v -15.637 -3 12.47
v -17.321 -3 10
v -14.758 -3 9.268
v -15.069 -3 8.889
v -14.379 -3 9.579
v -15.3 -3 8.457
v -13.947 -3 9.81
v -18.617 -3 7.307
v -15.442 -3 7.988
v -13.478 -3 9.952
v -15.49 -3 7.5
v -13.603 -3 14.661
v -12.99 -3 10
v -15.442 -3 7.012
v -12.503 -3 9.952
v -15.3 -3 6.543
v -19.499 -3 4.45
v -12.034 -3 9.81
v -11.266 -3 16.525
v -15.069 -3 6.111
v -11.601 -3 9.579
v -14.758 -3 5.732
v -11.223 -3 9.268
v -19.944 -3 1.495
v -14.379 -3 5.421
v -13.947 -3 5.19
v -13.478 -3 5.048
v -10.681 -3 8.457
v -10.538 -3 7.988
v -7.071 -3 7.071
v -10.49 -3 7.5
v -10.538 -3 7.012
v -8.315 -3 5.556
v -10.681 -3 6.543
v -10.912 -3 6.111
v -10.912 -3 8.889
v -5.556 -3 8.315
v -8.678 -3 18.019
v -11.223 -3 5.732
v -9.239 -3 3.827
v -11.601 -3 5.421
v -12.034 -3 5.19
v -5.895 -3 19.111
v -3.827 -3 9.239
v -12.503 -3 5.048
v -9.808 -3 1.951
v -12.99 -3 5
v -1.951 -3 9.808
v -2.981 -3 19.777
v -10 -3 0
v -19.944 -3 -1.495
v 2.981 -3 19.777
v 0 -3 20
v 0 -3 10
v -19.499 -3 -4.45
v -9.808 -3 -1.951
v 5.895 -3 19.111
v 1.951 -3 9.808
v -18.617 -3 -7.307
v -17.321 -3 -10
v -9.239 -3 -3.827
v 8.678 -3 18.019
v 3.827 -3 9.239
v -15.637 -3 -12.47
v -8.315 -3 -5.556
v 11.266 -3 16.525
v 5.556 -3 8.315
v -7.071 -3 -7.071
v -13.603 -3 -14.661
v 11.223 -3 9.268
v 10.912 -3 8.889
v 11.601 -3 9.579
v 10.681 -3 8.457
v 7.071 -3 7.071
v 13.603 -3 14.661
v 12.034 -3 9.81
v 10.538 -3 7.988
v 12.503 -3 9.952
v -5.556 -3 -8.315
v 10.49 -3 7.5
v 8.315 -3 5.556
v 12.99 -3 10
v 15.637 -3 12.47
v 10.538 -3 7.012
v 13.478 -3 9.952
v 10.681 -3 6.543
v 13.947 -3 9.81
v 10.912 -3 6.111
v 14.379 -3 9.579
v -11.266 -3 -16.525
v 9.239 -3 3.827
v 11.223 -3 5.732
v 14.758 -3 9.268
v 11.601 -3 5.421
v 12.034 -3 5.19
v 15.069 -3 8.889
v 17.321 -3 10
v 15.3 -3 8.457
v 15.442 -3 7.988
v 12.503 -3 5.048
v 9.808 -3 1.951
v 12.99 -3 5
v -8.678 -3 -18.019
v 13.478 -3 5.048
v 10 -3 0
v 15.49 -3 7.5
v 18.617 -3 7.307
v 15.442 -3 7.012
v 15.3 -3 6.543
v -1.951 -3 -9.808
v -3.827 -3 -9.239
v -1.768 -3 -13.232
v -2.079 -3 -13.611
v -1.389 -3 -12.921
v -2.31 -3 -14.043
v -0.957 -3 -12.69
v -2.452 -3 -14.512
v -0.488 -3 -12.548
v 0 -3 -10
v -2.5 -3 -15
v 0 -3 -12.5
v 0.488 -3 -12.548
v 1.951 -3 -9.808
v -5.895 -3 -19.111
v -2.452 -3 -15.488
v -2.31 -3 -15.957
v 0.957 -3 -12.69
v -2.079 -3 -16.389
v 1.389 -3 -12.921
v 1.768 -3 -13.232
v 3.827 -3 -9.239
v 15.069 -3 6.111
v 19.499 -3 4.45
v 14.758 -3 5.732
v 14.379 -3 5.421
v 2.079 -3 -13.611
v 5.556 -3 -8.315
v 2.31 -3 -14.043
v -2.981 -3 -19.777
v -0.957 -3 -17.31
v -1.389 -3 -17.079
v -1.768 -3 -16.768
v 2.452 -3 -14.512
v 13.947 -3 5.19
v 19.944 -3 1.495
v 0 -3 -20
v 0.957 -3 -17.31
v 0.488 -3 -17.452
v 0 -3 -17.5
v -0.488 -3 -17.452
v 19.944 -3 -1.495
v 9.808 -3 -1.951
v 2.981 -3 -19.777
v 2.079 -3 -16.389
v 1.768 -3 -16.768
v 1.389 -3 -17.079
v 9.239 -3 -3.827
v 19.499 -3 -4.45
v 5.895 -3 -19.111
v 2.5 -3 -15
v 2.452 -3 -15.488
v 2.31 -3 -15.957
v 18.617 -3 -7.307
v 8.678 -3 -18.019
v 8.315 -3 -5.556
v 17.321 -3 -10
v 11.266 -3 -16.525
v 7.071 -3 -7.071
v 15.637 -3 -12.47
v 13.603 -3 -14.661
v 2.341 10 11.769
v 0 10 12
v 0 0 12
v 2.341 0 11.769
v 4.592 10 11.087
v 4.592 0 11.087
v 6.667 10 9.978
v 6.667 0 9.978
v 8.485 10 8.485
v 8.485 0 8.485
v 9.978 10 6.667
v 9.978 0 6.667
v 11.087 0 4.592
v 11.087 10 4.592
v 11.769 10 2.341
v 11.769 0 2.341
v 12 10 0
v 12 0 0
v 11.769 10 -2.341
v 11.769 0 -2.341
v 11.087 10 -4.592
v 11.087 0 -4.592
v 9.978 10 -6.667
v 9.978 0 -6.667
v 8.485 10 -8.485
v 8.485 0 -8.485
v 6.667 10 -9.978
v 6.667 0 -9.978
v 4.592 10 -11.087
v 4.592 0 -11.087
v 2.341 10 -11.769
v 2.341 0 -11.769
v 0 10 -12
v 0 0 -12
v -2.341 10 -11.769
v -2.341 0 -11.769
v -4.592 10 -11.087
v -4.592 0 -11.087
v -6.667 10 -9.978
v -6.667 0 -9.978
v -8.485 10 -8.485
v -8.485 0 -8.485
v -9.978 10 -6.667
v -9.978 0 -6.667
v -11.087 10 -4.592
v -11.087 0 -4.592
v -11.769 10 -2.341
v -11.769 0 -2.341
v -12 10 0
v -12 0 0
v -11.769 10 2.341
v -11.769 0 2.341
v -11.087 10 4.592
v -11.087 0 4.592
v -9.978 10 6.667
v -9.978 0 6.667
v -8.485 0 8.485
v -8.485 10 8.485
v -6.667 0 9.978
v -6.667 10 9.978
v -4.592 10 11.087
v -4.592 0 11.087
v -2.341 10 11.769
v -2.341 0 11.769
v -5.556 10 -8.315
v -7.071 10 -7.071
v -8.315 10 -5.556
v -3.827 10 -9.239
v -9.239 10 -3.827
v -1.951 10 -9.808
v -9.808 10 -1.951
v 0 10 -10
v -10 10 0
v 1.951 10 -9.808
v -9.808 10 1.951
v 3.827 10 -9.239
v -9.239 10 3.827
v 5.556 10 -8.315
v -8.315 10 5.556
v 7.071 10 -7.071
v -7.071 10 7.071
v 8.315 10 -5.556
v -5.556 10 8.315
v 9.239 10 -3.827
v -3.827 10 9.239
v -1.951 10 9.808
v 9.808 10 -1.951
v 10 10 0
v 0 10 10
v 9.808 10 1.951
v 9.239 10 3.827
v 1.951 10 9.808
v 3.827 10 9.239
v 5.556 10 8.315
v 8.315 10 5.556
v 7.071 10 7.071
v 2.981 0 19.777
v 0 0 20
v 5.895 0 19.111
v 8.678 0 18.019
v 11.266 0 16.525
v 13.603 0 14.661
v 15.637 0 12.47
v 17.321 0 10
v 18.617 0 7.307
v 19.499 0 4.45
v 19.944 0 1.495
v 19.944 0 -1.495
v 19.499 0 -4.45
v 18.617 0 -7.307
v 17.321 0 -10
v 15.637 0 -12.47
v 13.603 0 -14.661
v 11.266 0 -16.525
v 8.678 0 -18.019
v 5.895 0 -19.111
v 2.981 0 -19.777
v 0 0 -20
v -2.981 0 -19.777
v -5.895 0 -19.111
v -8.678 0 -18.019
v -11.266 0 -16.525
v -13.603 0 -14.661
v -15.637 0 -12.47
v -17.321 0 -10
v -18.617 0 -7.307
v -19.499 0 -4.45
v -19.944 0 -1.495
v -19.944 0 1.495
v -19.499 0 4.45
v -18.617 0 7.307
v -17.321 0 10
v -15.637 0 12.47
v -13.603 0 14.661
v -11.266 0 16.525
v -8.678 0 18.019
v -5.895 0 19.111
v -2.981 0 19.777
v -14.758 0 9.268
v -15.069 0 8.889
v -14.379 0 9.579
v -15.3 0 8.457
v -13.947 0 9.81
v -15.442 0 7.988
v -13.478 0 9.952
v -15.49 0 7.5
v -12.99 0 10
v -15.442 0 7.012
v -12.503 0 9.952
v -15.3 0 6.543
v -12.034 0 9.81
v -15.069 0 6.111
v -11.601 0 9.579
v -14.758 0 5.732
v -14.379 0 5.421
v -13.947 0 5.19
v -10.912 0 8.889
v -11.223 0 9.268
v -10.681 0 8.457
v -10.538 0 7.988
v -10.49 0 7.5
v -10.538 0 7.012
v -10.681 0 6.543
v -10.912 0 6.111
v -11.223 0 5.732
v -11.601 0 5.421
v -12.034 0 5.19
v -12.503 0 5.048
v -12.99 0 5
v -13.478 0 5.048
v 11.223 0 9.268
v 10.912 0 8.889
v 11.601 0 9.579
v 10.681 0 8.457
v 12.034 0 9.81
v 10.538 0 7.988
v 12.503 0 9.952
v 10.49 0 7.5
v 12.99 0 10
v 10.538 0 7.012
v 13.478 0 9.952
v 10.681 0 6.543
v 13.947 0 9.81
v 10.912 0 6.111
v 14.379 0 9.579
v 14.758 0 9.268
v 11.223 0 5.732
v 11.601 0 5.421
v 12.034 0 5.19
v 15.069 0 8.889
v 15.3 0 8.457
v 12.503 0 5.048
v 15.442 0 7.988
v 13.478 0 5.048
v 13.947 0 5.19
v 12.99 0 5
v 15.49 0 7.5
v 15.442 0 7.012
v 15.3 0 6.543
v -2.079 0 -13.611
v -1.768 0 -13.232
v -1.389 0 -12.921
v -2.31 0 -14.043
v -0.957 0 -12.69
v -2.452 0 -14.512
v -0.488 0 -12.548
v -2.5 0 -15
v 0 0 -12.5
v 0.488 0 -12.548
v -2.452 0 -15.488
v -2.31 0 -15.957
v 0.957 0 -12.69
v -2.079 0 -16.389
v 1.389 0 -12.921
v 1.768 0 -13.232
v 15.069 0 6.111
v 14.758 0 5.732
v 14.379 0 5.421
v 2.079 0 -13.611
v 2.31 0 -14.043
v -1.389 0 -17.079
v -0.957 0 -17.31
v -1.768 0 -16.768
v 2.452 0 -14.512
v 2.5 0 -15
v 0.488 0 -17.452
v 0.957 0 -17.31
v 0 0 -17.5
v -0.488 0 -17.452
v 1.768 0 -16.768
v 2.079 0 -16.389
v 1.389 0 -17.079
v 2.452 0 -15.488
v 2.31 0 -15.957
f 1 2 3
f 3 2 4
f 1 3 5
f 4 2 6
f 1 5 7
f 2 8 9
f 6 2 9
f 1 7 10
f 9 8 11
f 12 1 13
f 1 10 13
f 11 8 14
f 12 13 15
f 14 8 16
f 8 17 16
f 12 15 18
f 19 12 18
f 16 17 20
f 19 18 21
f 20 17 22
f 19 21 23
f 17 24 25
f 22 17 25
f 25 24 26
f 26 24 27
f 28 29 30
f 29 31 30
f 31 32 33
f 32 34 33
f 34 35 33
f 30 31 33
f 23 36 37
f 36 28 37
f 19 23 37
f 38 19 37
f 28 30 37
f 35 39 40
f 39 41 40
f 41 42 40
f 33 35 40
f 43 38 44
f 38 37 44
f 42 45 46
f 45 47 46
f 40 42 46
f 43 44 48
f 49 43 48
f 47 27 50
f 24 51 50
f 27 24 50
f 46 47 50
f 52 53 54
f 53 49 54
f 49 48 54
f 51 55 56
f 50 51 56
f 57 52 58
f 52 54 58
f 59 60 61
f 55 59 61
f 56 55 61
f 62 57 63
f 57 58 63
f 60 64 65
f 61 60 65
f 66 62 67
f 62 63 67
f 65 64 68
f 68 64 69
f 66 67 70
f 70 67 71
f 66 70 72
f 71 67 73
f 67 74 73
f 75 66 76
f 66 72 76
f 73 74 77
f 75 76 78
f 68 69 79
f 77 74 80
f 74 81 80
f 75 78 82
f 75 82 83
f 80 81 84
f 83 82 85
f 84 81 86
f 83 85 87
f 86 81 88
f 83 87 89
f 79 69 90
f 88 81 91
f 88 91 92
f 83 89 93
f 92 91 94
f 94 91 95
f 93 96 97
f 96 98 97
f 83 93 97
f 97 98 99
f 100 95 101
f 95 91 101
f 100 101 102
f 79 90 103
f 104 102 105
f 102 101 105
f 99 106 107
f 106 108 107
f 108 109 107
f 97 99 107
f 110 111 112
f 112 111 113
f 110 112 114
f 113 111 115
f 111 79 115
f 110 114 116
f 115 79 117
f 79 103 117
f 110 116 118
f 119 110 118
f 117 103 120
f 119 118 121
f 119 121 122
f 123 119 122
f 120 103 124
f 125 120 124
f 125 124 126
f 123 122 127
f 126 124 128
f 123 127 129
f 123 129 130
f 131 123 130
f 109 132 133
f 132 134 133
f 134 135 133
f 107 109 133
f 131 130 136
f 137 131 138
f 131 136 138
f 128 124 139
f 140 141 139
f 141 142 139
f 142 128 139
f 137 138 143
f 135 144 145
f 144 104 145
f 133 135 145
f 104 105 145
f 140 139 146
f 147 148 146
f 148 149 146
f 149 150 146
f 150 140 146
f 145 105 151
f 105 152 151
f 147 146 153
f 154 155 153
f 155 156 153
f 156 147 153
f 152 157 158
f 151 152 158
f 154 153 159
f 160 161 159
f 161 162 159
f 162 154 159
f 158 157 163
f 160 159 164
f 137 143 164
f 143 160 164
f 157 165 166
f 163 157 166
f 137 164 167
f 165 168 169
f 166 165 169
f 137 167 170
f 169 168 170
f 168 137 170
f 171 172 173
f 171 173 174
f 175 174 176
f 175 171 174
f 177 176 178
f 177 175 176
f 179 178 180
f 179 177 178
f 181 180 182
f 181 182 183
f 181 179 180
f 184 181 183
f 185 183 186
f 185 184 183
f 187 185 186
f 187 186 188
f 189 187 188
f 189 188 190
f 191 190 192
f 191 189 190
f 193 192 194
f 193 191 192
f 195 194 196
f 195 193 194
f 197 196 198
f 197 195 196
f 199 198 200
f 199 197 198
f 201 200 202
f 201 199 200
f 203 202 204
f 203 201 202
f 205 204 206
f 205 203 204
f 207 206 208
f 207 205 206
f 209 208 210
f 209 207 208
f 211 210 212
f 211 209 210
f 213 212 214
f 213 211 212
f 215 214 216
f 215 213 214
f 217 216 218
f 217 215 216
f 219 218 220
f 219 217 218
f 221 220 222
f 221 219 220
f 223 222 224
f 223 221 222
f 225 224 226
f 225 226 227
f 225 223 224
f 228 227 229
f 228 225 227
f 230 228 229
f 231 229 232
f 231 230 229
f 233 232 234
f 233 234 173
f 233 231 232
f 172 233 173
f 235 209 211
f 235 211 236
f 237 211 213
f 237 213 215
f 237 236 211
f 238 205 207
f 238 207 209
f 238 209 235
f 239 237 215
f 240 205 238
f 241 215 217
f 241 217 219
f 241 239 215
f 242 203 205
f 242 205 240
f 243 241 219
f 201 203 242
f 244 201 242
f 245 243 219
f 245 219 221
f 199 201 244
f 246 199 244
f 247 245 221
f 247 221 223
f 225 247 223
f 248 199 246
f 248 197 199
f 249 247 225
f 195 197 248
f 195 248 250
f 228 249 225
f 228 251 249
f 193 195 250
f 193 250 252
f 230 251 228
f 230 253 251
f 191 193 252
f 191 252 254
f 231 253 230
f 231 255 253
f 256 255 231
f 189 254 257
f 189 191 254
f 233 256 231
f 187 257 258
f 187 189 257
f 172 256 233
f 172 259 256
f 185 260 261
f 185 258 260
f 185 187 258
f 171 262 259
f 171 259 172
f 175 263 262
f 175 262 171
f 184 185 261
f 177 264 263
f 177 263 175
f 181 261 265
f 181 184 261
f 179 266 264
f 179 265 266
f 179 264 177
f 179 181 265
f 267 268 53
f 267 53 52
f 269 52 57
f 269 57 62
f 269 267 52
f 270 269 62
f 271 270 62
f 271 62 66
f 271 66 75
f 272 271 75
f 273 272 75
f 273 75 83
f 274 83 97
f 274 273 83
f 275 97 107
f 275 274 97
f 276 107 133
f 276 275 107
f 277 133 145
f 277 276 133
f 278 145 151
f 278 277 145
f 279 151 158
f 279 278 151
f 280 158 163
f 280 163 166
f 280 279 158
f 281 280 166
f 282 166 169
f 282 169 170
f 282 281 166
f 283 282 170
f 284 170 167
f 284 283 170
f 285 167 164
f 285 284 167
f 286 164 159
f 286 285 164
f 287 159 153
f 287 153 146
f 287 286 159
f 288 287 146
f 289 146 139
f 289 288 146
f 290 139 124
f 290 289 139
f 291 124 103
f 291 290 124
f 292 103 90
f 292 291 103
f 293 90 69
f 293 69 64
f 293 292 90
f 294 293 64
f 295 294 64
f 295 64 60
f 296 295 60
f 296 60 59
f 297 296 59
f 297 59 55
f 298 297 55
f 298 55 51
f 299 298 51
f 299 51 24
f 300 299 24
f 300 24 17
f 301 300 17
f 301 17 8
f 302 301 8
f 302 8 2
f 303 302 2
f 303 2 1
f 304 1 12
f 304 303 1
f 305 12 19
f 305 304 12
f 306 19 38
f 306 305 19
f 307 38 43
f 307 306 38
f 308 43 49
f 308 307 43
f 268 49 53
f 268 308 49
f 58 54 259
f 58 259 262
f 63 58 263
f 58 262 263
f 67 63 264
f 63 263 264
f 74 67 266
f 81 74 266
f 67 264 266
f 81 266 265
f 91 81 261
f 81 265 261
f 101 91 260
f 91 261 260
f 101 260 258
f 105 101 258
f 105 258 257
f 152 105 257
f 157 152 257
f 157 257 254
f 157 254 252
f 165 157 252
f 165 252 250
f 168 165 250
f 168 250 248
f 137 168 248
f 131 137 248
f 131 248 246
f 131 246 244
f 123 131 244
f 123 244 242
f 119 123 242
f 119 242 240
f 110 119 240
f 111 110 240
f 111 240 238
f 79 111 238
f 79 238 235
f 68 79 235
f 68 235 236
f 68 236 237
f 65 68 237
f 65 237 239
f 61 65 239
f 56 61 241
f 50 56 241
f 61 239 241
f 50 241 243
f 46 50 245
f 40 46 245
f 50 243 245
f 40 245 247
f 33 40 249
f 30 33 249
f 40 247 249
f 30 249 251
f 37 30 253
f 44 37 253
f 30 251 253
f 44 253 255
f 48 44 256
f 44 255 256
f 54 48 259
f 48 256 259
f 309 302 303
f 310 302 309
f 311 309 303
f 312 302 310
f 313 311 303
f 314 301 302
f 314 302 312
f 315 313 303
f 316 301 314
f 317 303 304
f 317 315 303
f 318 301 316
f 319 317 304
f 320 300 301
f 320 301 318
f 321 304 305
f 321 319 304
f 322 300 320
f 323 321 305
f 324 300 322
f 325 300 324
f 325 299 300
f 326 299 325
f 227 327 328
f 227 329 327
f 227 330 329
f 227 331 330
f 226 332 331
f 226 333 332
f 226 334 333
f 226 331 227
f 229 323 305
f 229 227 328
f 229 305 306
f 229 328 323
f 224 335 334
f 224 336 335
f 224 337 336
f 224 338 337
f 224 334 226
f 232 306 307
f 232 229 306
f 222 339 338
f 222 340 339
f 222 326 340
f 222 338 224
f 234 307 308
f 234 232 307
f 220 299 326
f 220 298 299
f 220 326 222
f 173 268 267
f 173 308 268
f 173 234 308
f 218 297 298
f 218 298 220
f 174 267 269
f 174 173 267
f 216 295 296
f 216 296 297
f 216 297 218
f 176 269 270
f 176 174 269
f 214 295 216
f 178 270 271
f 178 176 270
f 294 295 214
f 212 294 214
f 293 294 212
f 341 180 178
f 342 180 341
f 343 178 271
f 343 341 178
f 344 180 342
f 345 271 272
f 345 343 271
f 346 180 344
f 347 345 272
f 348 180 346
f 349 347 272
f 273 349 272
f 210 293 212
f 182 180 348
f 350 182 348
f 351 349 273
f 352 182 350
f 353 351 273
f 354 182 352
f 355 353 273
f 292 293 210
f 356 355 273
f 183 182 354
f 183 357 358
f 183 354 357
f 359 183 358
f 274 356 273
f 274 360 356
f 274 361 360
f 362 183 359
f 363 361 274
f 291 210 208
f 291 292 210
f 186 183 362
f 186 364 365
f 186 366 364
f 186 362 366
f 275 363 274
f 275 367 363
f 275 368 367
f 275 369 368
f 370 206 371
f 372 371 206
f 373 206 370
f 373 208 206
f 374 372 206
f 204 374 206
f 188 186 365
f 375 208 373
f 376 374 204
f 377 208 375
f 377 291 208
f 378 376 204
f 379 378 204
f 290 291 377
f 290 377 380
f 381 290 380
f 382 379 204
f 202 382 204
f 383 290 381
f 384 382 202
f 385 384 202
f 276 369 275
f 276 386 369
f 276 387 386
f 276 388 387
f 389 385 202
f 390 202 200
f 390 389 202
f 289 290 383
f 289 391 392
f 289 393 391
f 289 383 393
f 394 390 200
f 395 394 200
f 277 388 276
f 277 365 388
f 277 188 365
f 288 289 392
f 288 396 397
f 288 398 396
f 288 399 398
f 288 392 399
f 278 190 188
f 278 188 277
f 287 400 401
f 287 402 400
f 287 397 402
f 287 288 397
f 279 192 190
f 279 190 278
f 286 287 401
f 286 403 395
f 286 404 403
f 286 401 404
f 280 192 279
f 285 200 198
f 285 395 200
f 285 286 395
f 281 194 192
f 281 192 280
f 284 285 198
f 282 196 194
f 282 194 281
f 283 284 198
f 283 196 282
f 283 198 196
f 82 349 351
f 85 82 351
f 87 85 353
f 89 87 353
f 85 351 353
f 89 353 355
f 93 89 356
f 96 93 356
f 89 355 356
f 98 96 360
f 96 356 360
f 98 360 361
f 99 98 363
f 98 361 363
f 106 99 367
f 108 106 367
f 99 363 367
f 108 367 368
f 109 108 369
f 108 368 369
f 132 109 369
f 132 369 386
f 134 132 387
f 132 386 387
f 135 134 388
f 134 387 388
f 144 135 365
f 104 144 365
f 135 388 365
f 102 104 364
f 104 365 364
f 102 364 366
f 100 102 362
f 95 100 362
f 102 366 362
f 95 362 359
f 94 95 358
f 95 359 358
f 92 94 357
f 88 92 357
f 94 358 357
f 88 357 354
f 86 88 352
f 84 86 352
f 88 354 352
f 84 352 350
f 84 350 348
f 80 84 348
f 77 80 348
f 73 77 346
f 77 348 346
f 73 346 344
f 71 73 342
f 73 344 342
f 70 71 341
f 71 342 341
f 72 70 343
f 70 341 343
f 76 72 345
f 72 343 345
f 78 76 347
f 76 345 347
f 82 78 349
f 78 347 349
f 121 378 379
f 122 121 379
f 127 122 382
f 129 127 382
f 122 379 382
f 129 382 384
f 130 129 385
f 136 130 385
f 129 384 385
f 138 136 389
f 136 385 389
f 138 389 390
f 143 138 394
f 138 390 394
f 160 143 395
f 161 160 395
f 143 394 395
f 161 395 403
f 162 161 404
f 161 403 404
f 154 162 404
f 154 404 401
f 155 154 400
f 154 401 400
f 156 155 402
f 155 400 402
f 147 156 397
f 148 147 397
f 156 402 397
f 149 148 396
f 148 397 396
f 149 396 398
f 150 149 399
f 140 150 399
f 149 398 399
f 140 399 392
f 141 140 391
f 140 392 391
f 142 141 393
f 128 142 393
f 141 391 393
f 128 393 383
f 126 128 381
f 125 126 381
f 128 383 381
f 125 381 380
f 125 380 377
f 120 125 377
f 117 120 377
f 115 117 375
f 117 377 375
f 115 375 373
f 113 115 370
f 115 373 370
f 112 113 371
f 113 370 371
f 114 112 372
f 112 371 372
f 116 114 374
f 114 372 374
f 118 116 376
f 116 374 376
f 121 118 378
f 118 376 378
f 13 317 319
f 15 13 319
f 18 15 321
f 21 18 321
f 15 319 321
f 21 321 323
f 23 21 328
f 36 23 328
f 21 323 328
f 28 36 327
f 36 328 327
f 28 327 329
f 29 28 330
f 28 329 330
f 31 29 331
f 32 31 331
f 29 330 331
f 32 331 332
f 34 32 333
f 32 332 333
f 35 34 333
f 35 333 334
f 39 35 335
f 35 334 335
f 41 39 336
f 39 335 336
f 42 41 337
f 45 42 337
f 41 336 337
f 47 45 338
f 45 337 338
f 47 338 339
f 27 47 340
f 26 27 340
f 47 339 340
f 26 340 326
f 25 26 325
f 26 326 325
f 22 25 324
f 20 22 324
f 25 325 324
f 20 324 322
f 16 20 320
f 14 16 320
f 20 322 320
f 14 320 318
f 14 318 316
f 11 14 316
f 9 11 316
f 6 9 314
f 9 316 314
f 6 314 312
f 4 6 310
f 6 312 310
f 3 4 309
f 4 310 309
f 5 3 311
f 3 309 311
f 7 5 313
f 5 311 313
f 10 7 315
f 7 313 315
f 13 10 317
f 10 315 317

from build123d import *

# Parameters (mm, degrees)
SKETCH1_R           = 20
SKETCH1_R_2         = 2.5
SKETCH1_R_3         = 10
BOSS_EXTRUDE1_DEPTH = 3
BOSS_EXTRUDE2_START = 10
SKETCH1_3_R         = 12
SKETCH1_3_R_2       = 10
BOSS_EXTRUDE2_DEPTH = 10


with BuildPart() as part:
    # Sketch1 → Boss-Extrude1 (new body)
    with BuildSketch(Plane(origin=(0, 0, 0), x_dir=(1, 0, 0), z_dir=(0, 1, 0))):
        Circle(SKETCH1_R)
        with Locations((-12.990381057, -7.5)):
            Circle(SKETCH1_R_2, mode=Mode.SUBTRACT)
        with Locations((12.990381057, -7.5)):
            Circle(SKETCH1_R_2, mode=Mode.SUBTRACT)
        with Locations((0, 15)):
            Circle(SKETCH1_R_2, mode=Mode.SUBTRACT)
        Circle(SKETCH1_R_3, mode=Mode.SUBTRACT)
    extrude(amount=-BOSS_EXTRUDE1_DEPTH)

    # Sketch1<3> → Boss-Extrude2 (add)
    with BuildSketch(Plane(origin=(0, 0, 0), x_dir=(1, 0, 0), z_dir=(0, 1, 0)).offset(BOSS_EXTRUDE2_START)):
        Circle(SKETCH1_3_R)
        Circle(SKETCH1_3_R_2, mode=Mode.SUBTRACT)
    extrude(amount=-BOSS_EXTRUDE2_DEPTH)


solid = part.part
